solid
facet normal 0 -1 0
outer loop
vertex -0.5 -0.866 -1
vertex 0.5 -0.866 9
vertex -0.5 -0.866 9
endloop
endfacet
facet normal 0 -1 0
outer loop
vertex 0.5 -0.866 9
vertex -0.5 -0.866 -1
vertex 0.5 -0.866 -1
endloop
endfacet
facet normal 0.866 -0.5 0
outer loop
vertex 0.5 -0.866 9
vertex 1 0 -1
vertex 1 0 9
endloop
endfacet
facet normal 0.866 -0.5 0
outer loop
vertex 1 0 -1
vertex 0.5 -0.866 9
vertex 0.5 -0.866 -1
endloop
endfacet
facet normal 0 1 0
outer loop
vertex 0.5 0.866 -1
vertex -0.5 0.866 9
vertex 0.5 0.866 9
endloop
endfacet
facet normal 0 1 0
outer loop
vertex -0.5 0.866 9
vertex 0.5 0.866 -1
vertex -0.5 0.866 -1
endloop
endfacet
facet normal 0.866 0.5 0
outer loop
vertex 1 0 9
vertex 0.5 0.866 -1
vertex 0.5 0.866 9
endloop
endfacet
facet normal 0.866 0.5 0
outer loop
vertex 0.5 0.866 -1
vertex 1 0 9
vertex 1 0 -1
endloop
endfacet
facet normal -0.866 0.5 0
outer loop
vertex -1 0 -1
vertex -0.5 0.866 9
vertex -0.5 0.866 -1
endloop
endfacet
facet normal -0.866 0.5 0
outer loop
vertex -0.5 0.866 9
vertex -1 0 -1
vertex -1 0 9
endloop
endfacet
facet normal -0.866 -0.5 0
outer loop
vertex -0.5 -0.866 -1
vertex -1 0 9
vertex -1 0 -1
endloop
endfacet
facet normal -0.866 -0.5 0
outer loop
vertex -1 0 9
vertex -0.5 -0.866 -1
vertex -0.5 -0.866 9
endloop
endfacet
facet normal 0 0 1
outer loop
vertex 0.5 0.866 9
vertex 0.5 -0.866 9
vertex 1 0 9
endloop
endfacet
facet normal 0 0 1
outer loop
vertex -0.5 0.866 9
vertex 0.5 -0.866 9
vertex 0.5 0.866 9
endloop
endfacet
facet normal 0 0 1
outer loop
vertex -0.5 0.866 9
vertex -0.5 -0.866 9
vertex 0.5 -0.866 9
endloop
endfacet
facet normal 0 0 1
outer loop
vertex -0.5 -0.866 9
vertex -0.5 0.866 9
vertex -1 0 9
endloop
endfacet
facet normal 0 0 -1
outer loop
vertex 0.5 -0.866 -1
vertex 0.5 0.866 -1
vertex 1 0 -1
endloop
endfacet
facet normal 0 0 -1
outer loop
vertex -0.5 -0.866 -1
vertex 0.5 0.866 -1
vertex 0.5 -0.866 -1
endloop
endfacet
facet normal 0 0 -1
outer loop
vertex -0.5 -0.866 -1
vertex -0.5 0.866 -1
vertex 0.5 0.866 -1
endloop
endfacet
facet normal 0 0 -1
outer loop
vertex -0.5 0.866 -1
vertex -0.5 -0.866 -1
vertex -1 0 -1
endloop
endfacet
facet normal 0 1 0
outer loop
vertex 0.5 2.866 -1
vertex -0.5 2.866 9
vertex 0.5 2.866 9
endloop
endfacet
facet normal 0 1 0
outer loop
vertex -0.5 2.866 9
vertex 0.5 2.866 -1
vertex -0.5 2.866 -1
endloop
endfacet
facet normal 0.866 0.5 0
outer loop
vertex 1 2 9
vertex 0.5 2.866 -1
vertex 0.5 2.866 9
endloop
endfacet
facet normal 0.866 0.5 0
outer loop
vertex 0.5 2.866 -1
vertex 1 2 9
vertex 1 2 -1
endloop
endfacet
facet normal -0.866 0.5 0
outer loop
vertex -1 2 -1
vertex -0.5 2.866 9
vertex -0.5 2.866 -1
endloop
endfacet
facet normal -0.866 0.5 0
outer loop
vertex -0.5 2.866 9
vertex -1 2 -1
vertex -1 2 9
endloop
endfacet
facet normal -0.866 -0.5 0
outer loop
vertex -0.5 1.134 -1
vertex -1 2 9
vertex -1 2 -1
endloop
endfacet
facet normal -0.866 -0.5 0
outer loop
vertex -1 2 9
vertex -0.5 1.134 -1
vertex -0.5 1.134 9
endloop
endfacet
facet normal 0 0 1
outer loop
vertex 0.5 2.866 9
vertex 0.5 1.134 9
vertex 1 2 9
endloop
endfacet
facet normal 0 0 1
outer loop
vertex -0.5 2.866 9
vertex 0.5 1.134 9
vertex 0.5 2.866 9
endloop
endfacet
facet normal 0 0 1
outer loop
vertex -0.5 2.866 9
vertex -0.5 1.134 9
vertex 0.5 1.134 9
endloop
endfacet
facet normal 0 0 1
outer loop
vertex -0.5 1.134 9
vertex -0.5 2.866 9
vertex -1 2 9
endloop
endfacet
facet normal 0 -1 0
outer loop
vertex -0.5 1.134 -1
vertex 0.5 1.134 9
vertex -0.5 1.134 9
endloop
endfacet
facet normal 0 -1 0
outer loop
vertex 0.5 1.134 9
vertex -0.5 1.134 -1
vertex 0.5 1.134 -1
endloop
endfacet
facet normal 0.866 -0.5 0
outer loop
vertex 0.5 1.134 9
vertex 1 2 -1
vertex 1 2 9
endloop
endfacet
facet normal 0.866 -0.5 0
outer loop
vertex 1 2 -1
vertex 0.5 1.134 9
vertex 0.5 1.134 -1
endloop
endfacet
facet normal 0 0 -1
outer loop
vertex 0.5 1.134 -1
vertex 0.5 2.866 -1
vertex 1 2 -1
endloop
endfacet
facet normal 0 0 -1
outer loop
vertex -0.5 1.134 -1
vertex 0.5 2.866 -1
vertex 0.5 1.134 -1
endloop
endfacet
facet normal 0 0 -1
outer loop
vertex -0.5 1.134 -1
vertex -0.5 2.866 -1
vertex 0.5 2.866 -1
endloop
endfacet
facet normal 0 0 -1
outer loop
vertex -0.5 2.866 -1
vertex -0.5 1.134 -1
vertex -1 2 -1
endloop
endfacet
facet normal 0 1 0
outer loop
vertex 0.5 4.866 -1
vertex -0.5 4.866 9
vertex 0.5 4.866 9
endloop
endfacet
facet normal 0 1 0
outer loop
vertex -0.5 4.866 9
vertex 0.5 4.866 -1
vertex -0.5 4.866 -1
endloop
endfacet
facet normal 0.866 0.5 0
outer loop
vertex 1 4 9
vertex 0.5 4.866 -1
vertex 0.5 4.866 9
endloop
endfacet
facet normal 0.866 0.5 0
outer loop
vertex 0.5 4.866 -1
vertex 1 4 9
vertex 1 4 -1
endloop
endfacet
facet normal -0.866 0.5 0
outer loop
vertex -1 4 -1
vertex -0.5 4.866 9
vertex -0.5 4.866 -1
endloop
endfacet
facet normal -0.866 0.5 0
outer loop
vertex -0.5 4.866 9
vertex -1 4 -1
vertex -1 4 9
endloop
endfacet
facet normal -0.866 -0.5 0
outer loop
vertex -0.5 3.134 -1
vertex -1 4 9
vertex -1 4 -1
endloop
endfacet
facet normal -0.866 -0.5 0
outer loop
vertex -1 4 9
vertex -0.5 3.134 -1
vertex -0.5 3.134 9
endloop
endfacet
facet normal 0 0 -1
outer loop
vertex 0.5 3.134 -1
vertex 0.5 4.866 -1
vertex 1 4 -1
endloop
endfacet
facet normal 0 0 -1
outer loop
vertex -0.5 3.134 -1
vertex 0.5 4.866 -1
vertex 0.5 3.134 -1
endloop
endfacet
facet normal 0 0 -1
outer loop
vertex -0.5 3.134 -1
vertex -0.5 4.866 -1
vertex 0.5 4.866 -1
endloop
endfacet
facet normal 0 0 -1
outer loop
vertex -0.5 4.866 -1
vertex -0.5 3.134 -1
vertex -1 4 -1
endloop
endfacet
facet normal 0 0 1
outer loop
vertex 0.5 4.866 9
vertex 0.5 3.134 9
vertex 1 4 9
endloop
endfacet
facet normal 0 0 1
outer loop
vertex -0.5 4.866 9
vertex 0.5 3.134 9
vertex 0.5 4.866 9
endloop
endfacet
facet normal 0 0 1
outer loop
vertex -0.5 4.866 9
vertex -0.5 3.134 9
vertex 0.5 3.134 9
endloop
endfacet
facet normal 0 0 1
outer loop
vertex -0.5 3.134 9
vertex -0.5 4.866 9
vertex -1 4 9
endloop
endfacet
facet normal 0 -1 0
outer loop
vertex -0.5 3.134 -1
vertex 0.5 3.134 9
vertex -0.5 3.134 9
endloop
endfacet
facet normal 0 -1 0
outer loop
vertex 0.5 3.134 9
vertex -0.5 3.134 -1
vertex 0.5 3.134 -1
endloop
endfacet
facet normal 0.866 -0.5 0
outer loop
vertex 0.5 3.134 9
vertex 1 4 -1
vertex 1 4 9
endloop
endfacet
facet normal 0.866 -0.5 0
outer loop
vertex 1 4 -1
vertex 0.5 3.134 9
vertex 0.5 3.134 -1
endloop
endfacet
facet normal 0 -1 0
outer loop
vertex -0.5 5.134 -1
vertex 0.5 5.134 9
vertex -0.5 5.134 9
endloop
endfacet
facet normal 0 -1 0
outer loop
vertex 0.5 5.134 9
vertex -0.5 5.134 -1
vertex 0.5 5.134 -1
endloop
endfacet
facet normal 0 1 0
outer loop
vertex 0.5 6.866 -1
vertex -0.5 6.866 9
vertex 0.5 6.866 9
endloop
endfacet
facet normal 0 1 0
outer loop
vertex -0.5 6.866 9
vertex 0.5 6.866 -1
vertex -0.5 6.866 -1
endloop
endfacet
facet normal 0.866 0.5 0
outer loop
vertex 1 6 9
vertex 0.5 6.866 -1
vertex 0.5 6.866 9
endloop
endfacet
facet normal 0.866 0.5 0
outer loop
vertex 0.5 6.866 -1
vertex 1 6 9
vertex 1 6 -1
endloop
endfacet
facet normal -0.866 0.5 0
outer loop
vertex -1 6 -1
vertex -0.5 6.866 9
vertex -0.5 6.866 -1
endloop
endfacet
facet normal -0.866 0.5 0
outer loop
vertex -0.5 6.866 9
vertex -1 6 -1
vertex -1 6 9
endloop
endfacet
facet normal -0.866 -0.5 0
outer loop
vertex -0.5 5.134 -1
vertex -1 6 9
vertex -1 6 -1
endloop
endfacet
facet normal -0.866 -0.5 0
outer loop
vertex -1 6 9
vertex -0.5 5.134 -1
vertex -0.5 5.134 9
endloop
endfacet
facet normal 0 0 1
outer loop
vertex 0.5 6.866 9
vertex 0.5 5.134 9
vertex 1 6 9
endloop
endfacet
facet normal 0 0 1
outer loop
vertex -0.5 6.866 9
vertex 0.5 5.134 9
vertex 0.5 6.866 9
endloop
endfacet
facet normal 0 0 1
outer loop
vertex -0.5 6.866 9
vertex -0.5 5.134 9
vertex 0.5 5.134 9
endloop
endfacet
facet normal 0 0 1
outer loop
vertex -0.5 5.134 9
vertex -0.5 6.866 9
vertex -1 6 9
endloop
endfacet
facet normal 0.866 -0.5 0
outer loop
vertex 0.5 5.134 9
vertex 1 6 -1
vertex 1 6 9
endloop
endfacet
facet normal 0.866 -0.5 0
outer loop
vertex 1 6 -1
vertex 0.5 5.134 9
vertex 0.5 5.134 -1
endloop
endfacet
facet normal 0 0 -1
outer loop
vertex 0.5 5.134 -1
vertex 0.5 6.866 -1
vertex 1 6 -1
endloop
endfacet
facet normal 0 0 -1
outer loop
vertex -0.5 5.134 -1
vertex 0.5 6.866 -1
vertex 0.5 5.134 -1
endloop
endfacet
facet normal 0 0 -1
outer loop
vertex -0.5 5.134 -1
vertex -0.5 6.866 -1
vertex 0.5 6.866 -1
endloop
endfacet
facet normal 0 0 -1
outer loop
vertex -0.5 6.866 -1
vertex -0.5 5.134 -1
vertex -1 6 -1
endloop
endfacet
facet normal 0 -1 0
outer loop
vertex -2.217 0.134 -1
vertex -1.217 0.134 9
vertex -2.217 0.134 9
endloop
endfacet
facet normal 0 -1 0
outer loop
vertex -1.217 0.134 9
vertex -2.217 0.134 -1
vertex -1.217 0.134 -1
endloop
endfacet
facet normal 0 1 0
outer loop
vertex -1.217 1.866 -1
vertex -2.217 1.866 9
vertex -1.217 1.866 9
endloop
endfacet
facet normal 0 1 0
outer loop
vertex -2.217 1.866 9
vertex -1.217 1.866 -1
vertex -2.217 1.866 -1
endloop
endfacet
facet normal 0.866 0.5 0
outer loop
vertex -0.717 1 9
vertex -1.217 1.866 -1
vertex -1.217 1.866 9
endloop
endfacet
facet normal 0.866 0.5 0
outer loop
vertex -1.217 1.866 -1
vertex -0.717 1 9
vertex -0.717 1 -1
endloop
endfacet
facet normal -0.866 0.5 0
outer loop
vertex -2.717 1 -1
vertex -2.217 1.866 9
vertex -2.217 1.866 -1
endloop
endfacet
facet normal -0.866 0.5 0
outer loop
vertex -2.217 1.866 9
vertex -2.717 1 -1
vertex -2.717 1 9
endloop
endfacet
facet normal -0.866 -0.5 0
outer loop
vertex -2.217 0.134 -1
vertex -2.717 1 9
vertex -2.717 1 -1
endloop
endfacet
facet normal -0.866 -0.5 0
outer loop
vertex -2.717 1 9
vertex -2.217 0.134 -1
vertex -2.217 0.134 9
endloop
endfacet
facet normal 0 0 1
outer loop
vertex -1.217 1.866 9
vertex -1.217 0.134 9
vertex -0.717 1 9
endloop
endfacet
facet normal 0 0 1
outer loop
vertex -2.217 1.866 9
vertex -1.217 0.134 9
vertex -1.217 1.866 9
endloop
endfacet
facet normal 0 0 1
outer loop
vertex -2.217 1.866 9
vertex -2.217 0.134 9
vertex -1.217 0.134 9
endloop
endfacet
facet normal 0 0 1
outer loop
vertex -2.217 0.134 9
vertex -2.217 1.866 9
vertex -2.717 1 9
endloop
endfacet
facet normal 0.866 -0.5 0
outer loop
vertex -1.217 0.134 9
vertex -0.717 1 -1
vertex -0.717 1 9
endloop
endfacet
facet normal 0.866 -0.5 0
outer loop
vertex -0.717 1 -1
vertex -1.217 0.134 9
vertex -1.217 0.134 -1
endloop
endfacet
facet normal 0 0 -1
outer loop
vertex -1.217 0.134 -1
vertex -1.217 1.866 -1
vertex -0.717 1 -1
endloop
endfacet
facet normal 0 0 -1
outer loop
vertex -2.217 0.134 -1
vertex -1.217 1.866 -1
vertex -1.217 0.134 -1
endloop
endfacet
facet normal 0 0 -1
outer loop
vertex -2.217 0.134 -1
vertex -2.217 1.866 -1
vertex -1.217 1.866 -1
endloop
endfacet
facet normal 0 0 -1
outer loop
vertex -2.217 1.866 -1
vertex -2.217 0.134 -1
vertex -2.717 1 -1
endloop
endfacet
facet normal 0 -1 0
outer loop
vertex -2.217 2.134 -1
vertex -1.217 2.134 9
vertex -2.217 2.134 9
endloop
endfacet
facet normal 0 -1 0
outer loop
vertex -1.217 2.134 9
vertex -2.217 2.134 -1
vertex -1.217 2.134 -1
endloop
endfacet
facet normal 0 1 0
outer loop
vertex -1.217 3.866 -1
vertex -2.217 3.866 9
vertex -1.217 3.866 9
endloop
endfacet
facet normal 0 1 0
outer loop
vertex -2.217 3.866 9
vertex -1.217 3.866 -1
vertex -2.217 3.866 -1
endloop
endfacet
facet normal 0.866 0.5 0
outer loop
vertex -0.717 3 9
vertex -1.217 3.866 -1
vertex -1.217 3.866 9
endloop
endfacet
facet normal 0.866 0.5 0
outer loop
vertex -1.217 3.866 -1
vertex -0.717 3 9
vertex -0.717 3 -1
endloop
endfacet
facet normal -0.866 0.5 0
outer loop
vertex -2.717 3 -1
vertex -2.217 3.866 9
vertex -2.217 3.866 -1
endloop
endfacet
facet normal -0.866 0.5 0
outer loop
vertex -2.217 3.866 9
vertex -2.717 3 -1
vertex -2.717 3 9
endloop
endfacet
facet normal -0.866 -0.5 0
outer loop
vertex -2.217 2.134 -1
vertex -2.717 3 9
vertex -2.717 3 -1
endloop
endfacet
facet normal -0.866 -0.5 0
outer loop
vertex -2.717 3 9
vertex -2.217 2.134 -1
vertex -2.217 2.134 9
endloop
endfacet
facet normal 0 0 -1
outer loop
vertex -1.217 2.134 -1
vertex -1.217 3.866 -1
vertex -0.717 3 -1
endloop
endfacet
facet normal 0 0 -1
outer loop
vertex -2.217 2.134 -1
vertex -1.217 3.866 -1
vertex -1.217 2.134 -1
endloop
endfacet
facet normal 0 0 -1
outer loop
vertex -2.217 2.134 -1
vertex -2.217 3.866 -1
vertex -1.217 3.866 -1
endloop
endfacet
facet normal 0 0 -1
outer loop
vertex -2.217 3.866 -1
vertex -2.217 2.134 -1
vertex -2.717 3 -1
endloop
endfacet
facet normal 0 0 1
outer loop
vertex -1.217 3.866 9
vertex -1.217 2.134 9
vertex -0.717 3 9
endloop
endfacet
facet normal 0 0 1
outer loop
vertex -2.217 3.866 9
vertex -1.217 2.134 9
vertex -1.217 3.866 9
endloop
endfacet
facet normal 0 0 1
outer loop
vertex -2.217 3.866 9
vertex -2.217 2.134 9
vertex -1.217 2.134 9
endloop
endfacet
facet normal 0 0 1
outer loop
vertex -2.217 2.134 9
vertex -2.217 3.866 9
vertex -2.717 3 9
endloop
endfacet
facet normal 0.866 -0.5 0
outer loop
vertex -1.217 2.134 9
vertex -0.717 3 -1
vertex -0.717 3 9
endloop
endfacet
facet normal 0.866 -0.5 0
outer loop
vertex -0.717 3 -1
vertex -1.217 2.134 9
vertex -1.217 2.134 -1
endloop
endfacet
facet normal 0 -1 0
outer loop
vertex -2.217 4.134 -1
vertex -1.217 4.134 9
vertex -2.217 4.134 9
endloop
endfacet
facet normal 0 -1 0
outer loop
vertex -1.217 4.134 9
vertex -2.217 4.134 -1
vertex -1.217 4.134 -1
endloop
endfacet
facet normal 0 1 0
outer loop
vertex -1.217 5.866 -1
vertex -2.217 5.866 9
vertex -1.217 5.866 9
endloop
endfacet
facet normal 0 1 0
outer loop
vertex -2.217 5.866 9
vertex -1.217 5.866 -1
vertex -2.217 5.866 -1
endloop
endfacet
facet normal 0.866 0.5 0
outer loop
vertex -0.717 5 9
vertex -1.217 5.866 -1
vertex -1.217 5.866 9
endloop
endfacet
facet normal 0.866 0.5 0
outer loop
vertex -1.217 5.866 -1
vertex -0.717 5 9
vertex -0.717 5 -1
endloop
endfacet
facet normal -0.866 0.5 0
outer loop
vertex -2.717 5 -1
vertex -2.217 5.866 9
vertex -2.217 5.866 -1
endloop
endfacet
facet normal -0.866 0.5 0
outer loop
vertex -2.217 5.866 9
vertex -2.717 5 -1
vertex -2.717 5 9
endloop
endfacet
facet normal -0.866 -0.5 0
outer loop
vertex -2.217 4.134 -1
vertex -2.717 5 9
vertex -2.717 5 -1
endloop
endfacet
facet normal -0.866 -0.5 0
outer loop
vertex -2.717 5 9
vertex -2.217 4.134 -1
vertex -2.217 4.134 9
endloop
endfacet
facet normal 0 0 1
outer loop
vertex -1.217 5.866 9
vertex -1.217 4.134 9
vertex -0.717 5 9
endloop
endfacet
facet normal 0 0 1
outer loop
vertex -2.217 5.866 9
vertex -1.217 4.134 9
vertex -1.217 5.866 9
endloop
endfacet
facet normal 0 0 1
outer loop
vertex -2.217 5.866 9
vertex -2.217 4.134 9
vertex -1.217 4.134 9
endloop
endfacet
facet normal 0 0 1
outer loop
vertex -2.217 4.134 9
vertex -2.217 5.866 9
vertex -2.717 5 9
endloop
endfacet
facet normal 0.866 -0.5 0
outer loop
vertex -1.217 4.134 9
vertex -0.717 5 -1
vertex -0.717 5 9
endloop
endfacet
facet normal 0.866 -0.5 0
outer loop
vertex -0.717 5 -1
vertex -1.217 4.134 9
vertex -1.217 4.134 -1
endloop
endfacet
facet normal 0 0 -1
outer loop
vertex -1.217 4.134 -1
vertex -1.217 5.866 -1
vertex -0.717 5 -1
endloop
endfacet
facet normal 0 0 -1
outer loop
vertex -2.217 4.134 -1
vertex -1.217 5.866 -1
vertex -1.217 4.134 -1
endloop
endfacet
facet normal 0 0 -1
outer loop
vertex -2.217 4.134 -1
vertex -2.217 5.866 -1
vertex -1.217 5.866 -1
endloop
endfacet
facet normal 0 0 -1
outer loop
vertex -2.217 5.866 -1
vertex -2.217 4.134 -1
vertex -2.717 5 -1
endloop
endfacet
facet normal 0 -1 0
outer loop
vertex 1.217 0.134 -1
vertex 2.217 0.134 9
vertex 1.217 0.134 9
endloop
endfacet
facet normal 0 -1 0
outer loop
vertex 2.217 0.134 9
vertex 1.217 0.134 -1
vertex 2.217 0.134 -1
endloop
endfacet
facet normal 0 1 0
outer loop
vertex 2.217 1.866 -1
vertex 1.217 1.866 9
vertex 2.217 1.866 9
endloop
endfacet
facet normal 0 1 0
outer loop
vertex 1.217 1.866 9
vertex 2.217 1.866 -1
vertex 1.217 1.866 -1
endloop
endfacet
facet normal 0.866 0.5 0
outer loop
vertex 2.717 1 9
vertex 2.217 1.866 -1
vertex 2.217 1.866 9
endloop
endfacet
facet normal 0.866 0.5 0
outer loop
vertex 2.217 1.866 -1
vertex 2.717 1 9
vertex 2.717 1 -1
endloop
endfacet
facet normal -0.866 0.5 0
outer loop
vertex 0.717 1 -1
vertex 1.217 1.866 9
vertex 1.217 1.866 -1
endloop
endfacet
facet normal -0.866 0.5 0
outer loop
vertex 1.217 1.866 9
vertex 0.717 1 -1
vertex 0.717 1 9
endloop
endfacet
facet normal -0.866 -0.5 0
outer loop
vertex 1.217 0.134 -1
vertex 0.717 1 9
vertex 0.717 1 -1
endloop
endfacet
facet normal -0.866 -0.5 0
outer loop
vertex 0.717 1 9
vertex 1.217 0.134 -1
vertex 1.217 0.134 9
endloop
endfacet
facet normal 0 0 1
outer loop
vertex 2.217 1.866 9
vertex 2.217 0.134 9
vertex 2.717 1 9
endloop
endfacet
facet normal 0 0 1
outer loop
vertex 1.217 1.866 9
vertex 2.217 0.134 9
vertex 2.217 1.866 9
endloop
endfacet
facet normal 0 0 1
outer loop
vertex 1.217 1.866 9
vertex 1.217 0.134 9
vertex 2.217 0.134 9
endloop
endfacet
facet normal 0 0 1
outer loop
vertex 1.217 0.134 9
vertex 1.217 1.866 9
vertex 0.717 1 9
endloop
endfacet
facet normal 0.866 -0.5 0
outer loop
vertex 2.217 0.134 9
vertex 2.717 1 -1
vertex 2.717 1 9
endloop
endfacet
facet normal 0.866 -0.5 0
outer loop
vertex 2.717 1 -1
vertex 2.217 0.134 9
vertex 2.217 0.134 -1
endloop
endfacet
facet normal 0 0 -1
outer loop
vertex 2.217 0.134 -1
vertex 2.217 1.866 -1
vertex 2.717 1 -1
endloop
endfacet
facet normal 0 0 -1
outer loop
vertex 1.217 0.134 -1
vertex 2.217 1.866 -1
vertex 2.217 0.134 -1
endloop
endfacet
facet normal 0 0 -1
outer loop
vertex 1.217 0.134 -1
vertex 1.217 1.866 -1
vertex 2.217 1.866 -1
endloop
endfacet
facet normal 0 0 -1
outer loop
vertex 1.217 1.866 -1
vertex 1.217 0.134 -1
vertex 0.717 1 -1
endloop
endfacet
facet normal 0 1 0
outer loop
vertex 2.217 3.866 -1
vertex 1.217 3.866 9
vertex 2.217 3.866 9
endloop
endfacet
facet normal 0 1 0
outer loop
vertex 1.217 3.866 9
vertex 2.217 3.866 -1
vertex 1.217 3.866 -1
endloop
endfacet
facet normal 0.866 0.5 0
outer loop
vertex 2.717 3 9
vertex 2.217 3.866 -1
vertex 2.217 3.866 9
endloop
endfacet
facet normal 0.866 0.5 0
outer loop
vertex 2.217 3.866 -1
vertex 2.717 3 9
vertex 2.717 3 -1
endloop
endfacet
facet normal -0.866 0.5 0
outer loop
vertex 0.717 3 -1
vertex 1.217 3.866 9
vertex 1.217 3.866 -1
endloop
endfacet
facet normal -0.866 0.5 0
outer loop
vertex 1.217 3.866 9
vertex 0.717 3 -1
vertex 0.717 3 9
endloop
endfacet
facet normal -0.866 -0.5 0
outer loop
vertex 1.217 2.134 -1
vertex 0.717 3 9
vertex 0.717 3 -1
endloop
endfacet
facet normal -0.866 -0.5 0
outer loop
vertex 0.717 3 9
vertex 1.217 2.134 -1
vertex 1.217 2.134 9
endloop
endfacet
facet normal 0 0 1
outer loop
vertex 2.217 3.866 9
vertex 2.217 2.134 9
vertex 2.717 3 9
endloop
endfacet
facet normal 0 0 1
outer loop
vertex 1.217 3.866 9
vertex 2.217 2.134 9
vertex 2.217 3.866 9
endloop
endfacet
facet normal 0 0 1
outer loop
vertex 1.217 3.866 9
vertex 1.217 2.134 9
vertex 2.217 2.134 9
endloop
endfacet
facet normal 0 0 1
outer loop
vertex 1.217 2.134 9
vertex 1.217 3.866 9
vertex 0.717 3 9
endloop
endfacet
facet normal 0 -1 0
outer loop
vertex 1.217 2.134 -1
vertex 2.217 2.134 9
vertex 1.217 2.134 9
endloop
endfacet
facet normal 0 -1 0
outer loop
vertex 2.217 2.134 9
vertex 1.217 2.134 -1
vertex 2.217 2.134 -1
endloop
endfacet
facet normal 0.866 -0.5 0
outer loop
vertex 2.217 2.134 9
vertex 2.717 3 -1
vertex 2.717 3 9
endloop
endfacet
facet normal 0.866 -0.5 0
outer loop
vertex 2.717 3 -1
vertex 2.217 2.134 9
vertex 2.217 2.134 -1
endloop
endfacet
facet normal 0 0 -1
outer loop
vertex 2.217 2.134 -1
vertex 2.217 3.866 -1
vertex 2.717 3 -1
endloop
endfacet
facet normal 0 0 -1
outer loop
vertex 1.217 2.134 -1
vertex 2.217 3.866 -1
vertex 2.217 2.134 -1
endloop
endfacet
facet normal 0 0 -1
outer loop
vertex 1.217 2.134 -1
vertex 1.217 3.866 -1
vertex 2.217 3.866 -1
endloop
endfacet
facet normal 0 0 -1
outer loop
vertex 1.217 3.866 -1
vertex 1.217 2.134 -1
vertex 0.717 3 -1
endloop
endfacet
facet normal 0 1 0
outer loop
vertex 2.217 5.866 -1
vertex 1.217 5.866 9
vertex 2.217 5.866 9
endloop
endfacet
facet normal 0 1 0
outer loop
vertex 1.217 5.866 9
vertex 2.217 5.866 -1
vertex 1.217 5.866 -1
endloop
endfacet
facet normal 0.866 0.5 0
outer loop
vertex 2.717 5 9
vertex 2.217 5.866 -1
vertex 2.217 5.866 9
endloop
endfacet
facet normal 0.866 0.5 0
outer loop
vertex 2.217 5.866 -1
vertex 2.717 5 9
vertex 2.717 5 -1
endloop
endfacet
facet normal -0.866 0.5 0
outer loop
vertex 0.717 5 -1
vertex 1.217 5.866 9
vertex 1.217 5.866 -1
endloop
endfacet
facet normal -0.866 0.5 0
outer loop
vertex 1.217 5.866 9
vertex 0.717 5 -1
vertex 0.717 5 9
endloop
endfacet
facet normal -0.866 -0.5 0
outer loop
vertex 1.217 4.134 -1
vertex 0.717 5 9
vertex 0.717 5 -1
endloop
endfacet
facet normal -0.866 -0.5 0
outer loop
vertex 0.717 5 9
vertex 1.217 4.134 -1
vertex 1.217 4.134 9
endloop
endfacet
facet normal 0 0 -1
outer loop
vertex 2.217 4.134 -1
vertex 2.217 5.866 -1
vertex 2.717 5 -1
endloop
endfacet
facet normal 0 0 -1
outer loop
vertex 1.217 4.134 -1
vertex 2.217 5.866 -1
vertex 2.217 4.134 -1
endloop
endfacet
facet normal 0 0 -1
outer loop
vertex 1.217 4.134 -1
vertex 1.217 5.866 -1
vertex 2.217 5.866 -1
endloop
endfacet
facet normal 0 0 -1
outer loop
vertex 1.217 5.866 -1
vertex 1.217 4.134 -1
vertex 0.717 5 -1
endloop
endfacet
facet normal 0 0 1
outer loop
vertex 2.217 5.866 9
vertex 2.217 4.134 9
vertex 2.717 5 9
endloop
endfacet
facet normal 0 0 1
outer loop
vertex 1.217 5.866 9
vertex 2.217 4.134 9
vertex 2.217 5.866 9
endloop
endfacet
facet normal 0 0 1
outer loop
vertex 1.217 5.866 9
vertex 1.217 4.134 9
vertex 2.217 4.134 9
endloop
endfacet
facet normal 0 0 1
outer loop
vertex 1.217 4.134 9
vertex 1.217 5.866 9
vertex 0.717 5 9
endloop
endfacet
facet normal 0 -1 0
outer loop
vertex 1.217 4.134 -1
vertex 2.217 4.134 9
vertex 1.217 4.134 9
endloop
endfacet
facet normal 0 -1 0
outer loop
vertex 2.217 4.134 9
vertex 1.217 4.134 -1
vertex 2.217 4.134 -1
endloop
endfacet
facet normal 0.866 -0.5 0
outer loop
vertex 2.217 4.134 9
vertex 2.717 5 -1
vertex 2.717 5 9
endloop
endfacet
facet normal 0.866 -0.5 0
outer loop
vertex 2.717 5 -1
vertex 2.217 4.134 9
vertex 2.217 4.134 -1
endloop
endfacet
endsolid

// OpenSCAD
// hexcut

//--------------------------------
module hexcut1(
R=1,
x0=0,
y0=0,
h0=10,
N0=4,
wall=1.0
){
        
    for (i=[0:N0-1]){
        translate([x0,y0+i*R*2,-1])
        cylinder(r=wall*R,h=h0,$fn=6);
    }
    for (i=[0:N0-2]){
        translate([x0-1.717*R,y0+R+i*R*2,-1])
        cylinder(r=wall*R,h=h0,$fn=6);
    }
    for (i=[0:N0-2]){
        translate([x0+1.717*R,y0+R+i*R*2,-1])
        cylinder(r=wall*R,h=h0,$fn=6);
    }

}


//=======================
    
hexcut1(R=1,x0=0,y0=0,h0=10,N0=4);
    
    
